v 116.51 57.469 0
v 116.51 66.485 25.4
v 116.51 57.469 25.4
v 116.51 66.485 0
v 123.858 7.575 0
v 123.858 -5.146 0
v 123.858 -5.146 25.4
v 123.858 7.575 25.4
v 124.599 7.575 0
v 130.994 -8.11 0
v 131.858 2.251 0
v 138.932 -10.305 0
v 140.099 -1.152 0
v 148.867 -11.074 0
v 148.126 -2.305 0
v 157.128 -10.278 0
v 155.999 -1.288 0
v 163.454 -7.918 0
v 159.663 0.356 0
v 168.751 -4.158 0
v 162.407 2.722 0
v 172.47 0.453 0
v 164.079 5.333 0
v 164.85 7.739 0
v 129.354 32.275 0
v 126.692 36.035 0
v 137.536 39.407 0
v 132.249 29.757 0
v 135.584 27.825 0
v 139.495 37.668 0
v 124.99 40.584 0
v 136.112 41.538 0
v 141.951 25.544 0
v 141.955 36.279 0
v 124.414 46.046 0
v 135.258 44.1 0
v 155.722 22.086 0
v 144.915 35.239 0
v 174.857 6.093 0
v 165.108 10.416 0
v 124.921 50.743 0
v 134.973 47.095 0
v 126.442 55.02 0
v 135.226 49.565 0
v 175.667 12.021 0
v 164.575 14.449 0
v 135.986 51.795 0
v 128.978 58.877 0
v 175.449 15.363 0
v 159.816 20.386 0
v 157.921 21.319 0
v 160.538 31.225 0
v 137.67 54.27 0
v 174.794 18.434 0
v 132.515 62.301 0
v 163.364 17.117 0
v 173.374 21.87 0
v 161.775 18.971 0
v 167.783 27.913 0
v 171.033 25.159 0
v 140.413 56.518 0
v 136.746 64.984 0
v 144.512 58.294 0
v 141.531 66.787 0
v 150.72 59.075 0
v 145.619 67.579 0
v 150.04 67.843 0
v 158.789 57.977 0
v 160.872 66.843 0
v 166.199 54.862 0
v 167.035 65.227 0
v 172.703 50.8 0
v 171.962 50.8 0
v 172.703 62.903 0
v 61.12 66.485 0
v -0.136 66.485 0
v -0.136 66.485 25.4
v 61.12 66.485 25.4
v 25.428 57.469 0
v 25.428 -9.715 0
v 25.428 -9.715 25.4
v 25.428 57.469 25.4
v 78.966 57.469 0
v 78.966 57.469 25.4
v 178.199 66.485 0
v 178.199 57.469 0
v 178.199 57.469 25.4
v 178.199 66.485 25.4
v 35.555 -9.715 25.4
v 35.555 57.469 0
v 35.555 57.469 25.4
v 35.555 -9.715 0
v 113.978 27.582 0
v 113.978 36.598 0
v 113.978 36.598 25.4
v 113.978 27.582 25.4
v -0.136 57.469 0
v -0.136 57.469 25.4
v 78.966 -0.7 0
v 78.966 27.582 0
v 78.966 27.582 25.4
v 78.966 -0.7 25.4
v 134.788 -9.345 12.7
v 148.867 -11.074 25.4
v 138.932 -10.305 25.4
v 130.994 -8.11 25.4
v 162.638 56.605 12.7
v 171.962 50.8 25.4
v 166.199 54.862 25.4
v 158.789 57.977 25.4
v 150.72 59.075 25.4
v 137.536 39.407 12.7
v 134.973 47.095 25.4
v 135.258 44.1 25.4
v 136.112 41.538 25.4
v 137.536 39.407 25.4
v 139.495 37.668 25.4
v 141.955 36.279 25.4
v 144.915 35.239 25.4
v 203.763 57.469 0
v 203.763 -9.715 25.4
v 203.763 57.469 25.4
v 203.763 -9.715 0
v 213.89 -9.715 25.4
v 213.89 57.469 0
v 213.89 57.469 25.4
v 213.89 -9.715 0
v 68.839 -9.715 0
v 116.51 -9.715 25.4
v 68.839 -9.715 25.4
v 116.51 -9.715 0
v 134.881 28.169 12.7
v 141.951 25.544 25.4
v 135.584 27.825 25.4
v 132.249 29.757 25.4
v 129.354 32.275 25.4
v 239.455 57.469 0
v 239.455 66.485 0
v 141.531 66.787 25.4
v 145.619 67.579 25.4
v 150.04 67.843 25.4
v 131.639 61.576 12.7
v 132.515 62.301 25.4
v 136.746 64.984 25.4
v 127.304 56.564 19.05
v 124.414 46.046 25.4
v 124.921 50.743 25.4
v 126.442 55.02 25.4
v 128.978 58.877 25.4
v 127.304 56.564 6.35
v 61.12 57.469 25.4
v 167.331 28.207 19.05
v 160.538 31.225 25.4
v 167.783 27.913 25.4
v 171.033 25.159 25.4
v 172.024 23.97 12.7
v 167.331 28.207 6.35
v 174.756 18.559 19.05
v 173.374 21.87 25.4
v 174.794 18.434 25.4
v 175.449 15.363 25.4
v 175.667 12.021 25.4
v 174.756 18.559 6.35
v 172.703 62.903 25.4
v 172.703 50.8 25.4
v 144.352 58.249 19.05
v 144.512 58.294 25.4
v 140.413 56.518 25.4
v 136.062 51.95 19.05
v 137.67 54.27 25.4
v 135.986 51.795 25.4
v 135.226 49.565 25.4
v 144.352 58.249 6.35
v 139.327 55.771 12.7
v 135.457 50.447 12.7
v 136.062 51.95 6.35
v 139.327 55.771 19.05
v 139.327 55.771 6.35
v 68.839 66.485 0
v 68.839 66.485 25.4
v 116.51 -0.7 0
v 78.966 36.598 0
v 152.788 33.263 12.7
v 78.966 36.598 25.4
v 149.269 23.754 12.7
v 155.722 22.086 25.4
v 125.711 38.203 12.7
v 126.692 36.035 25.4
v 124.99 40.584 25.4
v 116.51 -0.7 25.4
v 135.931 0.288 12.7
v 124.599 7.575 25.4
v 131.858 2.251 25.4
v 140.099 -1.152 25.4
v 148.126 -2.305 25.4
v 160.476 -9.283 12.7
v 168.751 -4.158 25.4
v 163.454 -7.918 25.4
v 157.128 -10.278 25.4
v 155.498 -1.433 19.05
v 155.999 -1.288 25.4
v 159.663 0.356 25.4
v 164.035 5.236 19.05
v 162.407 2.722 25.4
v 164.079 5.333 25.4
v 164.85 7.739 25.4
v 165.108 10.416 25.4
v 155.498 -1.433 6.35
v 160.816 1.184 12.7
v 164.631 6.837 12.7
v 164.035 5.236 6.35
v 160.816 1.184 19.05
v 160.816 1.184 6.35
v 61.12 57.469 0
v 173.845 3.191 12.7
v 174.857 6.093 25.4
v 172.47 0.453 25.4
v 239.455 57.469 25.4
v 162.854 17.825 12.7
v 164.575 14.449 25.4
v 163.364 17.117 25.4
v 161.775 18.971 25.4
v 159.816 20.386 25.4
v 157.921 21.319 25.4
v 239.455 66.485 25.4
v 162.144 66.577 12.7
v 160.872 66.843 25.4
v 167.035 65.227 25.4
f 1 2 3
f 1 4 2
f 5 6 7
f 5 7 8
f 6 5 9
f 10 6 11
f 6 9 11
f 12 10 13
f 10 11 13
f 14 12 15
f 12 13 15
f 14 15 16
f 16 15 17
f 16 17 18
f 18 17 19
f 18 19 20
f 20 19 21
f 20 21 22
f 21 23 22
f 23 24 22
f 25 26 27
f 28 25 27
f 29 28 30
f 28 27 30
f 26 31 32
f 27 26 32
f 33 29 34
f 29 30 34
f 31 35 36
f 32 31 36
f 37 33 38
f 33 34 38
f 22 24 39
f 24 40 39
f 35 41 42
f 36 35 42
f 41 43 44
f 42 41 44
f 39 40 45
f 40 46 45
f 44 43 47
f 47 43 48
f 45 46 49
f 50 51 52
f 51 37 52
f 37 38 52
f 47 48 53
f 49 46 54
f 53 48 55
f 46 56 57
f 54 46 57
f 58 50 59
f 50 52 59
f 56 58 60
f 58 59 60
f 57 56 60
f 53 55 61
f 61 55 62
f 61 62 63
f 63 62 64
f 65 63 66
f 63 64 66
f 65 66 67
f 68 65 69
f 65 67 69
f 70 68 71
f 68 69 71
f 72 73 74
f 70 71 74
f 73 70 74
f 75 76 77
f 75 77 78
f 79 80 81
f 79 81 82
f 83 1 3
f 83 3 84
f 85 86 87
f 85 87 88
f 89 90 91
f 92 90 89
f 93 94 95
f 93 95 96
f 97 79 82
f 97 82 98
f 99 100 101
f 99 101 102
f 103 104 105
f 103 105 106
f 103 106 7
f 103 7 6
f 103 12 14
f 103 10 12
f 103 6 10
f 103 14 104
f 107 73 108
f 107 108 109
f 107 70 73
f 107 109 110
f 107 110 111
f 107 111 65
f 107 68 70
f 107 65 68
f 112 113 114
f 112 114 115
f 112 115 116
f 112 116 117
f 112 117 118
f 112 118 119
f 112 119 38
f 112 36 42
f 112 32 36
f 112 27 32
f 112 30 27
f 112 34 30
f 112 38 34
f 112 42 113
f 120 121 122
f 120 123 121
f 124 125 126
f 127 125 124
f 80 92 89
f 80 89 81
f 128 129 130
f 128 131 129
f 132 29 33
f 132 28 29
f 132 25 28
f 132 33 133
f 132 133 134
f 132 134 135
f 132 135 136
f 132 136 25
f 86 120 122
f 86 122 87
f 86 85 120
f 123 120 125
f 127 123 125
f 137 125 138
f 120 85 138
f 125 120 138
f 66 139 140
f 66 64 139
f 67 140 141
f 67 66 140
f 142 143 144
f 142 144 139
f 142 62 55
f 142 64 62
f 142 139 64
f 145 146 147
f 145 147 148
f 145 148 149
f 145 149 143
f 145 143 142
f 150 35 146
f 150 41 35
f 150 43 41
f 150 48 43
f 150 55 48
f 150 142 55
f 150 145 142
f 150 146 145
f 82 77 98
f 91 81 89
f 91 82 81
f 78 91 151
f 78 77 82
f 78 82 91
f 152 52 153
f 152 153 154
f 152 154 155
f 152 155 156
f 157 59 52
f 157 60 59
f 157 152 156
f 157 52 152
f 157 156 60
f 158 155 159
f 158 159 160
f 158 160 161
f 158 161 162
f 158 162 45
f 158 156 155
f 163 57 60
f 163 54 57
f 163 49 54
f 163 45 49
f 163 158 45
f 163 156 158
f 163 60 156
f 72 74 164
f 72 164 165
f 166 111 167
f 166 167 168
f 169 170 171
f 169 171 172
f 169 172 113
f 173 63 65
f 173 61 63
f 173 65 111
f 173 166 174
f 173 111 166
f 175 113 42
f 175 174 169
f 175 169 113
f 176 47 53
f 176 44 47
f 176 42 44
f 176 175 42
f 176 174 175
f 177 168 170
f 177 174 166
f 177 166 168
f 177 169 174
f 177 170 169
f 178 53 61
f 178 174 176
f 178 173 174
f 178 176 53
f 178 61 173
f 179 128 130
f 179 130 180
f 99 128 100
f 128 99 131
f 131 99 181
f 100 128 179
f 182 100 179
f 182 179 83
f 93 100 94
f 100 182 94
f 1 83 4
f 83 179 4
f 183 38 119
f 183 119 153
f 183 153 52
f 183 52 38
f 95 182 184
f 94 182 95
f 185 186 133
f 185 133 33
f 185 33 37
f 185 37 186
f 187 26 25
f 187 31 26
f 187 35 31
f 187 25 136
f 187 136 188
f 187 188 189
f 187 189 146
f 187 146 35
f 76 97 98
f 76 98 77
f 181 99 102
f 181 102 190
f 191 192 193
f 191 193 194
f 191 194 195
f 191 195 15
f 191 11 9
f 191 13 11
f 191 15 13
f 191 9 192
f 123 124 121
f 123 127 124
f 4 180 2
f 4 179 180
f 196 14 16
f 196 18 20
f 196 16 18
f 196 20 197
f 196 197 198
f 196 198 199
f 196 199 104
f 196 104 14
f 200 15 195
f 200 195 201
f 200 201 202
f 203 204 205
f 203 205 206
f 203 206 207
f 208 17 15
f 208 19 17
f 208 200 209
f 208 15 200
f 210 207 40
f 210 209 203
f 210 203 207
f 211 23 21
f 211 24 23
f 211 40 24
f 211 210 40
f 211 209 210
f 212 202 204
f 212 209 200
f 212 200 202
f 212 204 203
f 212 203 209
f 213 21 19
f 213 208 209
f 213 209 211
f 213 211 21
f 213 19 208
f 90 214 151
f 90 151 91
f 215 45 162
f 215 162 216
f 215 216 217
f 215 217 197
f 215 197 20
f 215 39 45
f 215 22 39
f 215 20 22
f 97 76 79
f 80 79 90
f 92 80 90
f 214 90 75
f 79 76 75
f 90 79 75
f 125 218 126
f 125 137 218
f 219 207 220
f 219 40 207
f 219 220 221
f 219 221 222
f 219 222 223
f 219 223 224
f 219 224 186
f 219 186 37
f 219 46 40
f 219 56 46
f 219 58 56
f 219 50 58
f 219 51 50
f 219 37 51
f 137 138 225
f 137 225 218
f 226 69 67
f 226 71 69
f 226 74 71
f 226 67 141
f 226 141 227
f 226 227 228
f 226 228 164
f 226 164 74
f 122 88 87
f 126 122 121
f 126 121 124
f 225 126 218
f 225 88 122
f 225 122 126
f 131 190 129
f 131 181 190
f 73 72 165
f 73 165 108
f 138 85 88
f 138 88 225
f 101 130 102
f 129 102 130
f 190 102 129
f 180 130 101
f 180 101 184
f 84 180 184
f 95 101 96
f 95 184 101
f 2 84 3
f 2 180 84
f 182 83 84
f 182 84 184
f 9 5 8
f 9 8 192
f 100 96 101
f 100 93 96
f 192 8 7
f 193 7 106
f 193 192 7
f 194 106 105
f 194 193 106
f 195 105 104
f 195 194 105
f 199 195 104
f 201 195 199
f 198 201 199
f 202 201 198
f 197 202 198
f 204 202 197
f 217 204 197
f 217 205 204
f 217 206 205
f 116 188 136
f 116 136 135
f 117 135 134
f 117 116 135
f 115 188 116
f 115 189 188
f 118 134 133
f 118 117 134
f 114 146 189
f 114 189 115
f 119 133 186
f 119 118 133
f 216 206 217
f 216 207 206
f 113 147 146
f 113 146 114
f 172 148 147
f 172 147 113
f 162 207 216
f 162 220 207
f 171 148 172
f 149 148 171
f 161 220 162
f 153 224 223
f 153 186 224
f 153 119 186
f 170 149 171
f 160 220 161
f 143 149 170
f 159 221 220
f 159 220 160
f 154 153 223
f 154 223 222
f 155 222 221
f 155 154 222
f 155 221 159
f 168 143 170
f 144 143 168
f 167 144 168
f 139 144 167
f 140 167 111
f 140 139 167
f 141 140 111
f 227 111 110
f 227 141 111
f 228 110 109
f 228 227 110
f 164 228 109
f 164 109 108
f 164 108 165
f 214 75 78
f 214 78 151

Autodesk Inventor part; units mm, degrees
ref_plane "YZ Plane" through (0, 0, 0) normal (1, 0, 0) x (0, 1, 0)
ref_plane "XZ Plane" through (0, 0, 0) normal (0, 1, 0) x (-1, 0, 0)
ref_plane "XY Plane" through (0, 0, 0) normal (0, 0, 1) x (1, 0, 0)
sketch "Sketch1" plane through (0, 0, 0) normal (0, 0, 1) x (1, 0, 0)
  line L0 (-0.0747, 67.8433) -> (64.3882, 67.8433) construction
  line L1 (64.3882, 67.8433) -> (64.3882, 0.2263) construction
  line L2 (64.3882, 0.2263) -> (-0.0747, 0.2263) construction
  line L3 (-0.0747, 0.2263) -> (-0.0747, 67.8433) construction
  line L4 (25.4282, -9.7152) -> (25.4282, 57.4693)
  line L5 (25.4282, 57.4693) -> (-0.1365, 57.4693)
  line L6 (-0.1365, 57.4693) -> (-0.1365, 66.4848)
  line L7 (-0.1365, 66.4848) -> (61.12, 66.4848)
  line L8 (61.12, 66.4848) -> (61.12, 57.4693)
  line L9 (61.12, 57.4693) -> (35.5553, 57.4693)
  line L10 (35.5553, 57.4693) -> (35.5553, -9.7152)
  line L11 (35.5553, -9.7152) -> (25.4282, -9.7152)
  line L12 (68.8388, -9.7152) -> (68.8388, 66.4848)
  line L13 (68.8388, 66.4848) -> (116.5101, 66.4848)
  line L14 (116.5101, 66.4848) -> (116.5101, 57.4693)
  line L15 (116.5101, 57.4693) -> (78.9658, 57.4693)
  line L16 (78.9658, 57.4693) -> (78.9658, 36.5976)
  line L17 (78.9658, 36.5976) -> (113.9783, 36.5976)
  line L18 (113.9783, 36.5976) -> (113.9783, 27.5821)
  line L19 (113.9783, 27.5821) -> (78.9658, 27.5821)
  line L20 (78.9658, 27.5821) -> (78.9658, -0.6996)
  line L21 (78.9658, -0.6996) -> (116.5101, -0.6996)
  line L22 (116.5101, -0.6996) -> (116.5101, -9.7152)
  line L23 (116.5101, -9.7152) -> (68.8388, -9.7152)
  spline S0 degree 2 poles (148.8673, -11.0737) (140.5927, -11.0737) (128.9836, -7.6156) (123.8584, -5.1456) knots 0 0 0 1 2 2 2
  line L24 (123.8584, -5.1456) -> (123.8584, 7.575)
  line L25 (123.8584, 7.575) -> (124.5994, 7.575)
  spline S1 degree 2 poles (124.5994, 7.575) (129.6011, 2.8819) (142.26, -2.3051) (148.1263, -2.3051) knots 0 0 0 1 2 2 2
  spline S2 degree 2 poles (148.1263, -2.3051) (156.5243, -2.3051) (165.1076, 4.6727) (165.1076, 10.4155) knots 0 0 0 1 2 2 2
  spline S3 degree 2 poles (165.1076, 10.4155) (165.1076, 14.985) (160.5999, 20.666) (155.7216, 22.0863) knots 0 0 0 1 2 2 2
  spline S4 degree 2 poles (155.7216, 22.0863) (152.2018, 23.0743) (146.3355, 24.4328) (141.9512, 25.5443) knots 0 0 0 1 2 2 2
  spline S5 degree 2 poles (141.9512, 25.5443) (137.9992, 26.5941) (131.7624, 29.7433) (129.3541, 32.2751) knots 0 0 0 1 2 2 2
  spline S6 degree 2 poles (129.3541, 32.2751) (127.0076, 34.8069) (124.4141, 41.5994) (124.4141, 46.0455) knots 0 0 0 1 2 2 2
  spline S7 degree 2 poles (124.4141, 46.0455) (124.4141, 55.308) (138.8637, 67.8433) (150.0405, 67.8433) knots 0 0 0 1 2 2 2
  spline S8 degree 2 poles (150.0405, 67.8433) (156.4626, 67.8433) (167.8246, 65.3116) (172.7029, 62.9033) knots 0 0 0 1 2 2 2
  line L26 (172.7029, 62.9033) -> (172.7029, 50.8002)
  line L27 (172.7029, 50.8002) -> (171.9619, 50.8002)
  spline S9 degree 2 poles (171.9619, 50.8002) (168.3187, 54.1348) (156.9566, 59.0748) (150.7198, 59.0748) knots 0 0 0 1 2 2 2
  spline S10 degree 2 poles (150.7198, 59.0748) (143.6802, 59.0748) (134.9734, 52.4675) (134.9734, 47.0952) knots 0 0 0 1 2 2 2
  spline S11 degree 2 poles (134.9734, 47.0952) (134.9734, 42.2787) (140.0987, 36.5359) (144.9152, 35.2391) knots 0 0 0 1 2 2 2
  spline S12 degree 2 poles (144.9152, 35.2391) (148.1263, 34.3746) (157.4506, 32.1516) (160.5381, 31.2254) knots 0 0 0 1 2 2 2
  spline S13 degree 2 poles (160.5381, 31.2254) (168.3804, 28.8171) (175.667, 19.1223) (175.667, 12.021) knots 0 0 0 1 2 2 2
  spline S14 degree 2 poles (175.667, 12.021) (175.667, 7.5132) (172.0237, -1.1319) (168.7509, -4.1576) knots 0 0 0 1 2 2 2
  spline S15 degree 2 poles (168.7509, -4.1576) (165.1076, -7.4921) (155.8451, -11.0737) (148.8673, -11.0737) knots 0 0 0 1 2 2 2
  line L28 (203.7634, -9.7152) -> (203.7634, 57.4693)
  line L29 (203.7634, 57.4693) -> (178.1987, 57.4693)
  line L30 (178.1987, 57.4693) -> (178.1987, 66.4848)
  line L31 (178.1987, 66.4848) -> (239.4551, 66.4848)
  line L32 (239.4551, 66.4848) -> (239.4551, 57.4693)
  line L33 (239.4551, 57.4693) -> (213.8905, 57.4693)
  line L34 (213.8905, 57.4693) -> (213.8905, -9.7152)
  line L35 (213.8905, -9.7152) -> (203.7634, -9.7152)
  point P0 (0, 0)
extrude "Extrusion1" add sketch "Sketch1" along normal blind 25.4
properties part number "Standard - Amber select" material "Limestone"
